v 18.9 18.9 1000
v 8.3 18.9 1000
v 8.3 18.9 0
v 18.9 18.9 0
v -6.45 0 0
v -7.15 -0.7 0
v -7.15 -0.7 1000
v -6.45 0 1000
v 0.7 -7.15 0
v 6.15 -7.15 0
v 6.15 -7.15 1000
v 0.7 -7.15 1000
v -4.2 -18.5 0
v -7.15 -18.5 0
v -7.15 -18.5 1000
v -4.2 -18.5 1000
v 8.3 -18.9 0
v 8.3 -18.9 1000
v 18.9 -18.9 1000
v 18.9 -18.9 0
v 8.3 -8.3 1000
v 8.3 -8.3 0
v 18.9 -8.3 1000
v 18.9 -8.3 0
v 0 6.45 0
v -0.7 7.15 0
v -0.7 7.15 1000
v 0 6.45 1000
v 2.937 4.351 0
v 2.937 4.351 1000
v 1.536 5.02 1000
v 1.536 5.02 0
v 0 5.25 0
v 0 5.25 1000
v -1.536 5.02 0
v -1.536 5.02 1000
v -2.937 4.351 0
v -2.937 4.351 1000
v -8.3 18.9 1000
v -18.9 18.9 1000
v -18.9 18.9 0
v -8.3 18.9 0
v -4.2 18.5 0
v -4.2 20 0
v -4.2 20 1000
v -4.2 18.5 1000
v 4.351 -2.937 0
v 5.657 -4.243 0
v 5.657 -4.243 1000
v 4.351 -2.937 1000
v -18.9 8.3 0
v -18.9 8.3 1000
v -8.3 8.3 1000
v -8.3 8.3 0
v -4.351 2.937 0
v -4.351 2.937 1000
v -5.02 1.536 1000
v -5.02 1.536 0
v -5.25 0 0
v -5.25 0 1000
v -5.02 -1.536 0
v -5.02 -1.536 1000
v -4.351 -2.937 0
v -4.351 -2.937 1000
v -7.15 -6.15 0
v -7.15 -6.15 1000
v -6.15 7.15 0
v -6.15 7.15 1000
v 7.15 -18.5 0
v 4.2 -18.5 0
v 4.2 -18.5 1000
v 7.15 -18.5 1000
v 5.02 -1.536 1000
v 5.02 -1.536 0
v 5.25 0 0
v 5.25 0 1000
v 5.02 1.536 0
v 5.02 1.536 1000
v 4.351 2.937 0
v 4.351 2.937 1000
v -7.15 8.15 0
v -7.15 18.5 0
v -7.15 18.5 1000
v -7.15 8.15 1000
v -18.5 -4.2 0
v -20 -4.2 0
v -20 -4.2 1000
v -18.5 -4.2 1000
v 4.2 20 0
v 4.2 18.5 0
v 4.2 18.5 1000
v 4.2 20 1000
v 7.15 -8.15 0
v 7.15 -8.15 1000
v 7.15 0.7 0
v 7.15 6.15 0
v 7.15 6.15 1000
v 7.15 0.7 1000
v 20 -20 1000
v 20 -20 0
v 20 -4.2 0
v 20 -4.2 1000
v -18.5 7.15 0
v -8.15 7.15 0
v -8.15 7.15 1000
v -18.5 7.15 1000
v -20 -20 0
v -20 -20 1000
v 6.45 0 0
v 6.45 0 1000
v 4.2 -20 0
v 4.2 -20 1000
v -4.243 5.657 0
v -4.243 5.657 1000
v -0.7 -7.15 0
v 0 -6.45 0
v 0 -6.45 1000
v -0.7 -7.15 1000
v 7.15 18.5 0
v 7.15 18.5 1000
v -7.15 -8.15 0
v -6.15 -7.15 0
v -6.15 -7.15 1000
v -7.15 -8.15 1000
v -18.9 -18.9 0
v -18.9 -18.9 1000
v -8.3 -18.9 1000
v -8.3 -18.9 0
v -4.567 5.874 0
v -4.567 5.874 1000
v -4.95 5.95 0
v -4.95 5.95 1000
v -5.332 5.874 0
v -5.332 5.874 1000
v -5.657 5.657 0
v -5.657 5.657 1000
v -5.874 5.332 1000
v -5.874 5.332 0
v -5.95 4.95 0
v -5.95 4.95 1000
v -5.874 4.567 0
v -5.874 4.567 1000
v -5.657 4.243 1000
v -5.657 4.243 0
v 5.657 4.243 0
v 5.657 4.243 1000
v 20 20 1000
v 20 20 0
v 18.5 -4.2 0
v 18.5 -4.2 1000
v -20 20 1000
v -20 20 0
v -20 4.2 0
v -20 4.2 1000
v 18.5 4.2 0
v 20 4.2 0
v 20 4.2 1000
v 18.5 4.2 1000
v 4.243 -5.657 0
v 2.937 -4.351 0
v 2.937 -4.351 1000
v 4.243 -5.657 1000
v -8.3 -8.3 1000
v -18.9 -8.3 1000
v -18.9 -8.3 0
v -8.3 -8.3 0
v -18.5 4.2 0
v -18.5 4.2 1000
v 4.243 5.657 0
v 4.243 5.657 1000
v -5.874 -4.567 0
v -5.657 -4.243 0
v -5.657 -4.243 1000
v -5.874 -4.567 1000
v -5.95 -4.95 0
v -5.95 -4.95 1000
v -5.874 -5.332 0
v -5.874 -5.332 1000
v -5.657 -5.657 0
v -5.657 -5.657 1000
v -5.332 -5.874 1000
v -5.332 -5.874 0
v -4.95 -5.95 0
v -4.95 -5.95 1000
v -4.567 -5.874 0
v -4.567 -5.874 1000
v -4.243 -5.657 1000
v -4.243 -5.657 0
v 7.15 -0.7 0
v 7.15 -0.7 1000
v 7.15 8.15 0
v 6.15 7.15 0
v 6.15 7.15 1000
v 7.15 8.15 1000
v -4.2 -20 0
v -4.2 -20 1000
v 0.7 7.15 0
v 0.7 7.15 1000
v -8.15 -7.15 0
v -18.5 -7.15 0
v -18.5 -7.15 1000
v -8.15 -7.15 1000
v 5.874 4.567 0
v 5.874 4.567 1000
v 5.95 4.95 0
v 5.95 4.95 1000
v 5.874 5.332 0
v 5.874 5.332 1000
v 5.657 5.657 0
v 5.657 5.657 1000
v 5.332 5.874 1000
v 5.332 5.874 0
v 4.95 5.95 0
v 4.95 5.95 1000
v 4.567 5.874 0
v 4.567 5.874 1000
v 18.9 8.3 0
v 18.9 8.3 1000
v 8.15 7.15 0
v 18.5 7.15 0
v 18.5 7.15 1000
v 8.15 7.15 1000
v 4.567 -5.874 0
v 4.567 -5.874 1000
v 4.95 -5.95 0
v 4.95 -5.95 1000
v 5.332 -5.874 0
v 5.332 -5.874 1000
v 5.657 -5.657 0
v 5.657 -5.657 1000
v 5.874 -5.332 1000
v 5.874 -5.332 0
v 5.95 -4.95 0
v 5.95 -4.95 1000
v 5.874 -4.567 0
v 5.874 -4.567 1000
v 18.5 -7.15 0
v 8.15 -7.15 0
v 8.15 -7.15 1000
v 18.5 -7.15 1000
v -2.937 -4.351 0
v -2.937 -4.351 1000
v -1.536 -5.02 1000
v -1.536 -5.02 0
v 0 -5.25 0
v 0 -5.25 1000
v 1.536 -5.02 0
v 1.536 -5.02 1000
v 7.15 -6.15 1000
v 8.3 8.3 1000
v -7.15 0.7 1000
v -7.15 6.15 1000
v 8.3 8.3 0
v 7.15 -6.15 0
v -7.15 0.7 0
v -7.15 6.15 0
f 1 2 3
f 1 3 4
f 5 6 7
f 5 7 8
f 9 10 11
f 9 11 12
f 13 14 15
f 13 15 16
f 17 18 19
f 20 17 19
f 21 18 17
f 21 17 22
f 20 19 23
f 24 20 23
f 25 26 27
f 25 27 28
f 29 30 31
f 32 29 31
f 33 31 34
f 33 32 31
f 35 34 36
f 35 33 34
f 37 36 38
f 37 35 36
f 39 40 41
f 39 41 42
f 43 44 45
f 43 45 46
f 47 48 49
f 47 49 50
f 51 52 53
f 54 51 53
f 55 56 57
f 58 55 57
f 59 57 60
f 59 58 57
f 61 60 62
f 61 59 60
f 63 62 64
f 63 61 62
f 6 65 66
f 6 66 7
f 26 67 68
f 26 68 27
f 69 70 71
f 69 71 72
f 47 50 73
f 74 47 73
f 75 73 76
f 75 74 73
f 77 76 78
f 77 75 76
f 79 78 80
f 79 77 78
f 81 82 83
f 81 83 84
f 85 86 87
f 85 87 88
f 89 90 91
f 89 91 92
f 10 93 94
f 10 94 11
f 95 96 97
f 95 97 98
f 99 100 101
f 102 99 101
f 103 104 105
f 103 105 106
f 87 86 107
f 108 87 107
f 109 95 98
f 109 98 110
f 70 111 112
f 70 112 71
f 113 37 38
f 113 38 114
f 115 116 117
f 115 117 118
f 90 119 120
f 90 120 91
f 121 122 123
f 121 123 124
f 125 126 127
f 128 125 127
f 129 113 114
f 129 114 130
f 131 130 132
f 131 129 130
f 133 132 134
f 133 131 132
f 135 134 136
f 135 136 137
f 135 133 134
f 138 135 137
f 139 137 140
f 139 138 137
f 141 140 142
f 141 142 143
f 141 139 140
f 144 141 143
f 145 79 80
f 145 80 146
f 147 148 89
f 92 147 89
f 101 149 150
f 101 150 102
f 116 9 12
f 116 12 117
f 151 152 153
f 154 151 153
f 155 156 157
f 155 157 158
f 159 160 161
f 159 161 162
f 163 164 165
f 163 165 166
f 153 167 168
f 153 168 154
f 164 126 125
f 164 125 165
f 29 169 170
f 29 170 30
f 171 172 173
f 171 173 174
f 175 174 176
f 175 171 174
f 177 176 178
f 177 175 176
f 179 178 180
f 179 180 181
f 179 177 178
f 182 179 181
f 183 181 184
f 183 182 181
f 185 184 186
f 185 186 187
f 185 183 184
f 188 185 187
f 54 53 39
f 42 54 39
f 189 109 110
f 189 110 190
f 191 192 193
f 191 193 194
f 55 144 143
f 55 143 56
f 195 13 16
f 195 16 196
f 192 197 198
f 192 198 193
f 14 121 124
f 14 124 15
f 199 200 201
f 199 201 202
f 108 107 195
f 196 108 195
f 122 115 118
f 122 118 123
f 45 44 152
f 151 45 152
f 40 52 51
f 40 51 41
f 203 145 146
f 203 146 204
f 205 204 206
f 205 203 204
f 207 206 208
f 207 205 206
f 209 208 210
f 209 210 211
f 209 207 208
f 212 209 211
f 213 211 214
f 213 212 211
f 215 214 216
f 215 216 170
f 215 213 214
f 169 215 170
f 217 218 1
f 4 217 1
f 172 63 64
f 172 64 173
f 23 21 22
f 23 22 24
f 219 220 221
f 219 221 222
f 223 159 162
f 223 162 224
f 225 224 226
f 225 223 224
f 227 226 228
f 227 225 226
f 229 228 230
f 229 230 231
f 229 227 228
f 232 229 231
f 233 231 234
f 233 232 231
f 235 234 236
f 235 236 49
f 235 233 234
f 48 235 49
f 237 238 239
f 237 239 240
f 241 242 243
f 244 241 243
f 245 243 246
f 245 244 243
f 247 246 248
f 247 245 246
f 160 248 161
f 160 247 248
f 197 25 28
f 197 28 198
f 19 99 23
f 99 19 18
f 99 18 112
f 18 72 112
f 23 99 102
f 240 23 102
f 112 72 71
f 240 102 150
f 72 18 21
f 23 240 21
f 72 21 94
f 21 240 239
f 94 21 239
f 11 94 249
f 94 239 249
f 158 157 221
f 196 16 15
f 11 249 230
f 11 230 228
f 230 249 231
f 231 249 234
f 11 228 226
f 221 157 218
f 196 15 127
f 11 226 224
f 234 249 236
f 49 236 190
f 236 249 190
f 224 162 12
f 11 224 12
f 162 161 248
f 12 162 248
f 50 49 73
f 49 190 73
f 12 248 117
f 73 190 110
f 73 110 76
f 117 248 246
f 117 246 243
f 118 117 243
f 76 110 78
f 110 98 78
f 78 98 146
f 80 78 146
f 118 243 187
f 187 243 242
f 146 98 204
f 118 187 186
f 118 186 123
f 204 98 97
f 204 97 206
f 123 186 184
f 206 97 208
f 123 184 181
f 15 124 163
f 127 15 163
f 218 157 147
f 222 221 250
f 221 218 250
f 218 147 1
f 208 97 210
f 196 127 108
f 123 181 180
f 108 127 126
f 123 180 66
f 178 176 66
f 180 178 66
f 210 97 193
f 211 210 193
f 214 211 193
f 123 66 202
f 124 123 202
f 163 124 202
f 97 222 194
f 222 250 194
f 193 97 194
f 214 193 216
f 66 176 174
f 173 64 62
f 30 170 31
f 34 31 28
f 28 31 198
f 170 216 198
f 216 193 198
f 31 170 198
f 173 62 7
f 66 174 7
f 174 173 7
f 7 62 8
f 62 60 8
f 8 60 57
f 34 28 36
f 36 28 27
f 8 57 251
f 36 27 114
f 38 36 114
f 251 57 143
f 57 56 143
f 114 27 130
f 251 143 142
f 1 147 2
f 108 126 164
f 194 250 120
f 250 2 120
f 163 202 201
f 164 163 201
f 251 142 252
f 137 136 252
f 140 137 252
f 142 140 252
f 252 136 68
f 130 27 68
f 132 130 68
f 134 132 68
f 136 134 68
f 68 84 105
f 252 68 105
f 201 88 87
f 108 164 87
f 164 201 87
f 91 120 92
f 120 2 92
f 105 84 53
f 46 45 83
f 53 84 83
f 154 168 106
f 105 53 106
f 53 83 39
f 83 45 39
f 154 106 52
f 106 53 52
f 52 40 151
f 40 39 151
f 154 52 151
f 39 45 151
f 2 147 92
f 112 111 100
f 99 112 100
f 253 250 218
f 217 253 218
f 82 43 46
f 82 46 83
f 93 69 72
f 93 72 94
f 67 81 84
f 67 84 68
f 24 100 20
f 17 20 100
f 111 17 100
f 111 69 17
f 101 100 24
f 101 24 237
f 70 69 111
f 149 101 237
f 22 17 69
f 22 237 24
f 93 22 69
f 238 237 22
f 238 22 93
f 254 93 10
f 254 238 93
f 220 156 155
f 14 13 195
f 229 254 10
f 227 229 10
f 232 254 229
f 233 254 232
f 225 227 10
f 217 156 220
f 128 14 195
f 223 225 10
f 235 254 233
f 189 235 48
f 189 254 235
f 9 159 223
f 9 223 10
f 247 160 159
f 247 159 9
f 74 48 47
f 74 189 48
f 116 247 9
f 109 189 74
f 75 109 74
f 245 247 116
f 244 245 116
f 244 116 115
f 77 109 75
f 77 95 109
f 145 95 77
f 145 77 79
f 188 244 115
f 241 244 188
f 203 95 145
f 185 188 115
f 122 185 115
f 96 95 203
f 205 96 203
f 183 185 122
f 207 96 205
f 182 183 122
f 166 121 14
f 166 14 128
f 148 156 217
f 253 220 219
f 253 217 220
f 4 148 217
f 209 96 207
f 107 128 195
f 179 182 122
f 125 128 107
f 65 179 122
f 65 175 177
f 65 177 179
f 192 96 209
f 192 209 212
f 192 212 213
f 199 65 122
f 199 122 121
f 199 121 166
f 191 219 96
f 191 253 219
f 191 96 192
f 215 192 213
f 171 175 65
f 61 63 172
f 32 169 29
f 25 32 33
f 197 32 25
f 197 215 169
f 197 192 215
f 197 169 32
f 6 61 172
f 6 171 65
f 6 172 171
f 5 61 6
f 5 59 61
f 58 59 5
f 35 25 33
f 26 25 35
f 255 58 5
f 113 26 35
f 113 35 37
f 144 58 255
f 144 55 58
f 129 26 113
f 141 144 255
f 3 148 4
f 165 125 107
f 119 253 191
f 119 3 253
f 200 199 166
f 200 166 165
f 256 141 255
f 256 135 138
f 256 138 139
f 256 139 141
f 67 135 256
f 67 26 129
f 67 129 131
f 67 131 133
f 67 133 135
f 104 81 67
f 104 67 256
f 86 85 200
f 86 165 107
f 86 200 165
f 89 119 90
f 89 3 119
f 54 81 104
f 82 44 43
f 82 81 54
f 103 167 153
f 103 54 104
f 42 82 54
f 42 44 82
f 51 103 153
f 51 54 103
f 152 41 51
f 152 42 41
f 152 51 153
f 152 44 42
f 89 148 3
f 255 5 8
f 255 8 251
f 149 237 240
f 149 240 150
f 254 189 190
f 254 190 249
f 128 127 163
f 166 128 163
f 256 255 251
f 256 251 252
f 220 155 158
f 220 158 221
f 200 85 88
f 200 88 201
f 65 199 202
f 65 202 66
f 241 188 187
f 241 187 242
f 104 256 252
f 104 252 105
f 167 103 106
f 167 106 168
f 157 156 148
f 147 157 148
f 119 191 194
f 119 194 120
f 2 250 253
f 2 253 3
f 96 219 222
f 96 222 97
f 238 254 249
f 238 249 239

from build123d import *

# Parameters (mm, degrees)
SKETCH_1_W      = 10.6
SKETCH_1_H      = 10.6
EXTRUDE_1_DEPTH = 1000


with BuildPart() as part:
    # Эскиз1 → Бобышка-Вытянуть1 (new body)
    with BuildSketch(Plane.XY):
        Polygon((-20, 7.15), (-20, 20), (-7.15, 20), (-4.2, 20), (-4.2, 18.5), (-7.15, 18.5), (-7.15, 8.15), (-6.15, 7.15), (-0.7, 7.15), (0, 6.45), (0.7, 7.15), (6.15, 7.15), (7.15, 8.15), (7.15, 18.5), (4.2, 18.5), (4.2, 20), (7.15, 20), (20, 20), (20, 7.15), (20, 4.2), (18.5, 4.2), (18.5, 7.15), (8.15, 7.15), (7.15, 6.15), (7.15, 0.7), (6.45, 0), (7.15, -0.7), (7.15, -6.15), (8.15, -7.15), (18.5, -7.15), (18.5, -4.2), (20, -4.2), (20, -7.15), (20, -20), (7.15, -20), (4.2, -20), (4.2, -18.5), (7.15, -18.5), (7.15, -8.15), (6.15, -7.15), (0.7, -7.15), (0, -6.45), (-0.7, -7.15), (-6.15, -7.15), (-7.15, -8.15), (-7.15, -18.5), (-4.2, -18.5), (-4.2, -20), (-7.15, -20), (-20, -20), (-20, -7.15), (-20, -4.2), (-18.5, -4.2), (-18.5, -7.15), (-8.15, -7.15), (-7.15, -6.15), (-7.15, -0.7), (-6.45, 0), (-7.15, 0.7), (-7.15, 6.15), (-8.15, 7.15), (-18.5, 7.15), (-18.5, 4.2), (-20, 4.2), align=None)
        with Locations((13.6, 13.6)):
            Rectangle(SKETCH_1_W, SKETCH_1_H, mode=Mode.SUBTRACT)
        with Locations((-13.6, 13.6)):
            Rectangle(SKETCH_1_W, SKETCH_1_H, mode=Mode.SUBTRACT)
        with Locations((13.6, -13.6)):
            Rectangle(SKETCH_1_W, SKETCH_1_H, mode=Mode.SUBTRACT)
        with Locations((-13.6, -13.6)):
            Rectangle(SKETCH_1_W, SKETCH_1_H, mode=Mode.SUBTRACT)
        with BuildLine():
            Line((4.242640687, 5.656854249), (2.937238153, 4.351451715))
            ThreePointArc((2.937238153, 4.351451715), (0, 5.25), (-2.937238153, 4.351451715))
            Line((-2.937238153, 4.351451715), (-4.242640687, 5.656854249))
            ThreePointArc((-4.242640687, 5.656854249), (-5.656854249, 5.656854249), (-5.656854249, 4.242640687))
            Line((-5.656854249, 4.242640687), (-4.351451715, 2.937238153))
            ThreePointArc((-4.351451715, 2.937238153), (-5.25, 0), (-4.351451715, -2.937238153))
            Line((-4.351451715, -2.937238153), (-5.656854249, -4.242640687))
            ThreePointArc((-5.656854249, -4.242640687), (-5.656854249, -5.656854249), (-4.242640687, -5.656854249))
            Line((-4.242640687, -5.656854249), (-2.937238153, -4.351451715))
            ThreePointArc((-2.937238153, -4.351451715), (0, -5.25), (2.937238153, -4.351451715))
            Line((2.937238153, -4.351451715), (4.242640687, -5.656854249))
            ThreePointArc((4.242640687, -5.656854249), (5.656854249, -5.656854249), (5.656854249, -4.242640687))
            Line((5.656854249, -4.242640687), (4.351451715, -2.937238153))
            ThreePointArc((4.351451715, -2.937238153), (5.25, 0), (4.351451715, 2.937238153))
            Line((4.351451715, 2.937238153), (5.656854249, 4.242640687))
            ThreePointArc((5.656854249, 4.242640687), (5.656854249, 5.656854249), (4.242640687, 5.656854249))
        make_face(mode=Mode.SUBTRACT)
    extrude(amount=EXTRUDE_1_DEPTH)


solid = part.part
